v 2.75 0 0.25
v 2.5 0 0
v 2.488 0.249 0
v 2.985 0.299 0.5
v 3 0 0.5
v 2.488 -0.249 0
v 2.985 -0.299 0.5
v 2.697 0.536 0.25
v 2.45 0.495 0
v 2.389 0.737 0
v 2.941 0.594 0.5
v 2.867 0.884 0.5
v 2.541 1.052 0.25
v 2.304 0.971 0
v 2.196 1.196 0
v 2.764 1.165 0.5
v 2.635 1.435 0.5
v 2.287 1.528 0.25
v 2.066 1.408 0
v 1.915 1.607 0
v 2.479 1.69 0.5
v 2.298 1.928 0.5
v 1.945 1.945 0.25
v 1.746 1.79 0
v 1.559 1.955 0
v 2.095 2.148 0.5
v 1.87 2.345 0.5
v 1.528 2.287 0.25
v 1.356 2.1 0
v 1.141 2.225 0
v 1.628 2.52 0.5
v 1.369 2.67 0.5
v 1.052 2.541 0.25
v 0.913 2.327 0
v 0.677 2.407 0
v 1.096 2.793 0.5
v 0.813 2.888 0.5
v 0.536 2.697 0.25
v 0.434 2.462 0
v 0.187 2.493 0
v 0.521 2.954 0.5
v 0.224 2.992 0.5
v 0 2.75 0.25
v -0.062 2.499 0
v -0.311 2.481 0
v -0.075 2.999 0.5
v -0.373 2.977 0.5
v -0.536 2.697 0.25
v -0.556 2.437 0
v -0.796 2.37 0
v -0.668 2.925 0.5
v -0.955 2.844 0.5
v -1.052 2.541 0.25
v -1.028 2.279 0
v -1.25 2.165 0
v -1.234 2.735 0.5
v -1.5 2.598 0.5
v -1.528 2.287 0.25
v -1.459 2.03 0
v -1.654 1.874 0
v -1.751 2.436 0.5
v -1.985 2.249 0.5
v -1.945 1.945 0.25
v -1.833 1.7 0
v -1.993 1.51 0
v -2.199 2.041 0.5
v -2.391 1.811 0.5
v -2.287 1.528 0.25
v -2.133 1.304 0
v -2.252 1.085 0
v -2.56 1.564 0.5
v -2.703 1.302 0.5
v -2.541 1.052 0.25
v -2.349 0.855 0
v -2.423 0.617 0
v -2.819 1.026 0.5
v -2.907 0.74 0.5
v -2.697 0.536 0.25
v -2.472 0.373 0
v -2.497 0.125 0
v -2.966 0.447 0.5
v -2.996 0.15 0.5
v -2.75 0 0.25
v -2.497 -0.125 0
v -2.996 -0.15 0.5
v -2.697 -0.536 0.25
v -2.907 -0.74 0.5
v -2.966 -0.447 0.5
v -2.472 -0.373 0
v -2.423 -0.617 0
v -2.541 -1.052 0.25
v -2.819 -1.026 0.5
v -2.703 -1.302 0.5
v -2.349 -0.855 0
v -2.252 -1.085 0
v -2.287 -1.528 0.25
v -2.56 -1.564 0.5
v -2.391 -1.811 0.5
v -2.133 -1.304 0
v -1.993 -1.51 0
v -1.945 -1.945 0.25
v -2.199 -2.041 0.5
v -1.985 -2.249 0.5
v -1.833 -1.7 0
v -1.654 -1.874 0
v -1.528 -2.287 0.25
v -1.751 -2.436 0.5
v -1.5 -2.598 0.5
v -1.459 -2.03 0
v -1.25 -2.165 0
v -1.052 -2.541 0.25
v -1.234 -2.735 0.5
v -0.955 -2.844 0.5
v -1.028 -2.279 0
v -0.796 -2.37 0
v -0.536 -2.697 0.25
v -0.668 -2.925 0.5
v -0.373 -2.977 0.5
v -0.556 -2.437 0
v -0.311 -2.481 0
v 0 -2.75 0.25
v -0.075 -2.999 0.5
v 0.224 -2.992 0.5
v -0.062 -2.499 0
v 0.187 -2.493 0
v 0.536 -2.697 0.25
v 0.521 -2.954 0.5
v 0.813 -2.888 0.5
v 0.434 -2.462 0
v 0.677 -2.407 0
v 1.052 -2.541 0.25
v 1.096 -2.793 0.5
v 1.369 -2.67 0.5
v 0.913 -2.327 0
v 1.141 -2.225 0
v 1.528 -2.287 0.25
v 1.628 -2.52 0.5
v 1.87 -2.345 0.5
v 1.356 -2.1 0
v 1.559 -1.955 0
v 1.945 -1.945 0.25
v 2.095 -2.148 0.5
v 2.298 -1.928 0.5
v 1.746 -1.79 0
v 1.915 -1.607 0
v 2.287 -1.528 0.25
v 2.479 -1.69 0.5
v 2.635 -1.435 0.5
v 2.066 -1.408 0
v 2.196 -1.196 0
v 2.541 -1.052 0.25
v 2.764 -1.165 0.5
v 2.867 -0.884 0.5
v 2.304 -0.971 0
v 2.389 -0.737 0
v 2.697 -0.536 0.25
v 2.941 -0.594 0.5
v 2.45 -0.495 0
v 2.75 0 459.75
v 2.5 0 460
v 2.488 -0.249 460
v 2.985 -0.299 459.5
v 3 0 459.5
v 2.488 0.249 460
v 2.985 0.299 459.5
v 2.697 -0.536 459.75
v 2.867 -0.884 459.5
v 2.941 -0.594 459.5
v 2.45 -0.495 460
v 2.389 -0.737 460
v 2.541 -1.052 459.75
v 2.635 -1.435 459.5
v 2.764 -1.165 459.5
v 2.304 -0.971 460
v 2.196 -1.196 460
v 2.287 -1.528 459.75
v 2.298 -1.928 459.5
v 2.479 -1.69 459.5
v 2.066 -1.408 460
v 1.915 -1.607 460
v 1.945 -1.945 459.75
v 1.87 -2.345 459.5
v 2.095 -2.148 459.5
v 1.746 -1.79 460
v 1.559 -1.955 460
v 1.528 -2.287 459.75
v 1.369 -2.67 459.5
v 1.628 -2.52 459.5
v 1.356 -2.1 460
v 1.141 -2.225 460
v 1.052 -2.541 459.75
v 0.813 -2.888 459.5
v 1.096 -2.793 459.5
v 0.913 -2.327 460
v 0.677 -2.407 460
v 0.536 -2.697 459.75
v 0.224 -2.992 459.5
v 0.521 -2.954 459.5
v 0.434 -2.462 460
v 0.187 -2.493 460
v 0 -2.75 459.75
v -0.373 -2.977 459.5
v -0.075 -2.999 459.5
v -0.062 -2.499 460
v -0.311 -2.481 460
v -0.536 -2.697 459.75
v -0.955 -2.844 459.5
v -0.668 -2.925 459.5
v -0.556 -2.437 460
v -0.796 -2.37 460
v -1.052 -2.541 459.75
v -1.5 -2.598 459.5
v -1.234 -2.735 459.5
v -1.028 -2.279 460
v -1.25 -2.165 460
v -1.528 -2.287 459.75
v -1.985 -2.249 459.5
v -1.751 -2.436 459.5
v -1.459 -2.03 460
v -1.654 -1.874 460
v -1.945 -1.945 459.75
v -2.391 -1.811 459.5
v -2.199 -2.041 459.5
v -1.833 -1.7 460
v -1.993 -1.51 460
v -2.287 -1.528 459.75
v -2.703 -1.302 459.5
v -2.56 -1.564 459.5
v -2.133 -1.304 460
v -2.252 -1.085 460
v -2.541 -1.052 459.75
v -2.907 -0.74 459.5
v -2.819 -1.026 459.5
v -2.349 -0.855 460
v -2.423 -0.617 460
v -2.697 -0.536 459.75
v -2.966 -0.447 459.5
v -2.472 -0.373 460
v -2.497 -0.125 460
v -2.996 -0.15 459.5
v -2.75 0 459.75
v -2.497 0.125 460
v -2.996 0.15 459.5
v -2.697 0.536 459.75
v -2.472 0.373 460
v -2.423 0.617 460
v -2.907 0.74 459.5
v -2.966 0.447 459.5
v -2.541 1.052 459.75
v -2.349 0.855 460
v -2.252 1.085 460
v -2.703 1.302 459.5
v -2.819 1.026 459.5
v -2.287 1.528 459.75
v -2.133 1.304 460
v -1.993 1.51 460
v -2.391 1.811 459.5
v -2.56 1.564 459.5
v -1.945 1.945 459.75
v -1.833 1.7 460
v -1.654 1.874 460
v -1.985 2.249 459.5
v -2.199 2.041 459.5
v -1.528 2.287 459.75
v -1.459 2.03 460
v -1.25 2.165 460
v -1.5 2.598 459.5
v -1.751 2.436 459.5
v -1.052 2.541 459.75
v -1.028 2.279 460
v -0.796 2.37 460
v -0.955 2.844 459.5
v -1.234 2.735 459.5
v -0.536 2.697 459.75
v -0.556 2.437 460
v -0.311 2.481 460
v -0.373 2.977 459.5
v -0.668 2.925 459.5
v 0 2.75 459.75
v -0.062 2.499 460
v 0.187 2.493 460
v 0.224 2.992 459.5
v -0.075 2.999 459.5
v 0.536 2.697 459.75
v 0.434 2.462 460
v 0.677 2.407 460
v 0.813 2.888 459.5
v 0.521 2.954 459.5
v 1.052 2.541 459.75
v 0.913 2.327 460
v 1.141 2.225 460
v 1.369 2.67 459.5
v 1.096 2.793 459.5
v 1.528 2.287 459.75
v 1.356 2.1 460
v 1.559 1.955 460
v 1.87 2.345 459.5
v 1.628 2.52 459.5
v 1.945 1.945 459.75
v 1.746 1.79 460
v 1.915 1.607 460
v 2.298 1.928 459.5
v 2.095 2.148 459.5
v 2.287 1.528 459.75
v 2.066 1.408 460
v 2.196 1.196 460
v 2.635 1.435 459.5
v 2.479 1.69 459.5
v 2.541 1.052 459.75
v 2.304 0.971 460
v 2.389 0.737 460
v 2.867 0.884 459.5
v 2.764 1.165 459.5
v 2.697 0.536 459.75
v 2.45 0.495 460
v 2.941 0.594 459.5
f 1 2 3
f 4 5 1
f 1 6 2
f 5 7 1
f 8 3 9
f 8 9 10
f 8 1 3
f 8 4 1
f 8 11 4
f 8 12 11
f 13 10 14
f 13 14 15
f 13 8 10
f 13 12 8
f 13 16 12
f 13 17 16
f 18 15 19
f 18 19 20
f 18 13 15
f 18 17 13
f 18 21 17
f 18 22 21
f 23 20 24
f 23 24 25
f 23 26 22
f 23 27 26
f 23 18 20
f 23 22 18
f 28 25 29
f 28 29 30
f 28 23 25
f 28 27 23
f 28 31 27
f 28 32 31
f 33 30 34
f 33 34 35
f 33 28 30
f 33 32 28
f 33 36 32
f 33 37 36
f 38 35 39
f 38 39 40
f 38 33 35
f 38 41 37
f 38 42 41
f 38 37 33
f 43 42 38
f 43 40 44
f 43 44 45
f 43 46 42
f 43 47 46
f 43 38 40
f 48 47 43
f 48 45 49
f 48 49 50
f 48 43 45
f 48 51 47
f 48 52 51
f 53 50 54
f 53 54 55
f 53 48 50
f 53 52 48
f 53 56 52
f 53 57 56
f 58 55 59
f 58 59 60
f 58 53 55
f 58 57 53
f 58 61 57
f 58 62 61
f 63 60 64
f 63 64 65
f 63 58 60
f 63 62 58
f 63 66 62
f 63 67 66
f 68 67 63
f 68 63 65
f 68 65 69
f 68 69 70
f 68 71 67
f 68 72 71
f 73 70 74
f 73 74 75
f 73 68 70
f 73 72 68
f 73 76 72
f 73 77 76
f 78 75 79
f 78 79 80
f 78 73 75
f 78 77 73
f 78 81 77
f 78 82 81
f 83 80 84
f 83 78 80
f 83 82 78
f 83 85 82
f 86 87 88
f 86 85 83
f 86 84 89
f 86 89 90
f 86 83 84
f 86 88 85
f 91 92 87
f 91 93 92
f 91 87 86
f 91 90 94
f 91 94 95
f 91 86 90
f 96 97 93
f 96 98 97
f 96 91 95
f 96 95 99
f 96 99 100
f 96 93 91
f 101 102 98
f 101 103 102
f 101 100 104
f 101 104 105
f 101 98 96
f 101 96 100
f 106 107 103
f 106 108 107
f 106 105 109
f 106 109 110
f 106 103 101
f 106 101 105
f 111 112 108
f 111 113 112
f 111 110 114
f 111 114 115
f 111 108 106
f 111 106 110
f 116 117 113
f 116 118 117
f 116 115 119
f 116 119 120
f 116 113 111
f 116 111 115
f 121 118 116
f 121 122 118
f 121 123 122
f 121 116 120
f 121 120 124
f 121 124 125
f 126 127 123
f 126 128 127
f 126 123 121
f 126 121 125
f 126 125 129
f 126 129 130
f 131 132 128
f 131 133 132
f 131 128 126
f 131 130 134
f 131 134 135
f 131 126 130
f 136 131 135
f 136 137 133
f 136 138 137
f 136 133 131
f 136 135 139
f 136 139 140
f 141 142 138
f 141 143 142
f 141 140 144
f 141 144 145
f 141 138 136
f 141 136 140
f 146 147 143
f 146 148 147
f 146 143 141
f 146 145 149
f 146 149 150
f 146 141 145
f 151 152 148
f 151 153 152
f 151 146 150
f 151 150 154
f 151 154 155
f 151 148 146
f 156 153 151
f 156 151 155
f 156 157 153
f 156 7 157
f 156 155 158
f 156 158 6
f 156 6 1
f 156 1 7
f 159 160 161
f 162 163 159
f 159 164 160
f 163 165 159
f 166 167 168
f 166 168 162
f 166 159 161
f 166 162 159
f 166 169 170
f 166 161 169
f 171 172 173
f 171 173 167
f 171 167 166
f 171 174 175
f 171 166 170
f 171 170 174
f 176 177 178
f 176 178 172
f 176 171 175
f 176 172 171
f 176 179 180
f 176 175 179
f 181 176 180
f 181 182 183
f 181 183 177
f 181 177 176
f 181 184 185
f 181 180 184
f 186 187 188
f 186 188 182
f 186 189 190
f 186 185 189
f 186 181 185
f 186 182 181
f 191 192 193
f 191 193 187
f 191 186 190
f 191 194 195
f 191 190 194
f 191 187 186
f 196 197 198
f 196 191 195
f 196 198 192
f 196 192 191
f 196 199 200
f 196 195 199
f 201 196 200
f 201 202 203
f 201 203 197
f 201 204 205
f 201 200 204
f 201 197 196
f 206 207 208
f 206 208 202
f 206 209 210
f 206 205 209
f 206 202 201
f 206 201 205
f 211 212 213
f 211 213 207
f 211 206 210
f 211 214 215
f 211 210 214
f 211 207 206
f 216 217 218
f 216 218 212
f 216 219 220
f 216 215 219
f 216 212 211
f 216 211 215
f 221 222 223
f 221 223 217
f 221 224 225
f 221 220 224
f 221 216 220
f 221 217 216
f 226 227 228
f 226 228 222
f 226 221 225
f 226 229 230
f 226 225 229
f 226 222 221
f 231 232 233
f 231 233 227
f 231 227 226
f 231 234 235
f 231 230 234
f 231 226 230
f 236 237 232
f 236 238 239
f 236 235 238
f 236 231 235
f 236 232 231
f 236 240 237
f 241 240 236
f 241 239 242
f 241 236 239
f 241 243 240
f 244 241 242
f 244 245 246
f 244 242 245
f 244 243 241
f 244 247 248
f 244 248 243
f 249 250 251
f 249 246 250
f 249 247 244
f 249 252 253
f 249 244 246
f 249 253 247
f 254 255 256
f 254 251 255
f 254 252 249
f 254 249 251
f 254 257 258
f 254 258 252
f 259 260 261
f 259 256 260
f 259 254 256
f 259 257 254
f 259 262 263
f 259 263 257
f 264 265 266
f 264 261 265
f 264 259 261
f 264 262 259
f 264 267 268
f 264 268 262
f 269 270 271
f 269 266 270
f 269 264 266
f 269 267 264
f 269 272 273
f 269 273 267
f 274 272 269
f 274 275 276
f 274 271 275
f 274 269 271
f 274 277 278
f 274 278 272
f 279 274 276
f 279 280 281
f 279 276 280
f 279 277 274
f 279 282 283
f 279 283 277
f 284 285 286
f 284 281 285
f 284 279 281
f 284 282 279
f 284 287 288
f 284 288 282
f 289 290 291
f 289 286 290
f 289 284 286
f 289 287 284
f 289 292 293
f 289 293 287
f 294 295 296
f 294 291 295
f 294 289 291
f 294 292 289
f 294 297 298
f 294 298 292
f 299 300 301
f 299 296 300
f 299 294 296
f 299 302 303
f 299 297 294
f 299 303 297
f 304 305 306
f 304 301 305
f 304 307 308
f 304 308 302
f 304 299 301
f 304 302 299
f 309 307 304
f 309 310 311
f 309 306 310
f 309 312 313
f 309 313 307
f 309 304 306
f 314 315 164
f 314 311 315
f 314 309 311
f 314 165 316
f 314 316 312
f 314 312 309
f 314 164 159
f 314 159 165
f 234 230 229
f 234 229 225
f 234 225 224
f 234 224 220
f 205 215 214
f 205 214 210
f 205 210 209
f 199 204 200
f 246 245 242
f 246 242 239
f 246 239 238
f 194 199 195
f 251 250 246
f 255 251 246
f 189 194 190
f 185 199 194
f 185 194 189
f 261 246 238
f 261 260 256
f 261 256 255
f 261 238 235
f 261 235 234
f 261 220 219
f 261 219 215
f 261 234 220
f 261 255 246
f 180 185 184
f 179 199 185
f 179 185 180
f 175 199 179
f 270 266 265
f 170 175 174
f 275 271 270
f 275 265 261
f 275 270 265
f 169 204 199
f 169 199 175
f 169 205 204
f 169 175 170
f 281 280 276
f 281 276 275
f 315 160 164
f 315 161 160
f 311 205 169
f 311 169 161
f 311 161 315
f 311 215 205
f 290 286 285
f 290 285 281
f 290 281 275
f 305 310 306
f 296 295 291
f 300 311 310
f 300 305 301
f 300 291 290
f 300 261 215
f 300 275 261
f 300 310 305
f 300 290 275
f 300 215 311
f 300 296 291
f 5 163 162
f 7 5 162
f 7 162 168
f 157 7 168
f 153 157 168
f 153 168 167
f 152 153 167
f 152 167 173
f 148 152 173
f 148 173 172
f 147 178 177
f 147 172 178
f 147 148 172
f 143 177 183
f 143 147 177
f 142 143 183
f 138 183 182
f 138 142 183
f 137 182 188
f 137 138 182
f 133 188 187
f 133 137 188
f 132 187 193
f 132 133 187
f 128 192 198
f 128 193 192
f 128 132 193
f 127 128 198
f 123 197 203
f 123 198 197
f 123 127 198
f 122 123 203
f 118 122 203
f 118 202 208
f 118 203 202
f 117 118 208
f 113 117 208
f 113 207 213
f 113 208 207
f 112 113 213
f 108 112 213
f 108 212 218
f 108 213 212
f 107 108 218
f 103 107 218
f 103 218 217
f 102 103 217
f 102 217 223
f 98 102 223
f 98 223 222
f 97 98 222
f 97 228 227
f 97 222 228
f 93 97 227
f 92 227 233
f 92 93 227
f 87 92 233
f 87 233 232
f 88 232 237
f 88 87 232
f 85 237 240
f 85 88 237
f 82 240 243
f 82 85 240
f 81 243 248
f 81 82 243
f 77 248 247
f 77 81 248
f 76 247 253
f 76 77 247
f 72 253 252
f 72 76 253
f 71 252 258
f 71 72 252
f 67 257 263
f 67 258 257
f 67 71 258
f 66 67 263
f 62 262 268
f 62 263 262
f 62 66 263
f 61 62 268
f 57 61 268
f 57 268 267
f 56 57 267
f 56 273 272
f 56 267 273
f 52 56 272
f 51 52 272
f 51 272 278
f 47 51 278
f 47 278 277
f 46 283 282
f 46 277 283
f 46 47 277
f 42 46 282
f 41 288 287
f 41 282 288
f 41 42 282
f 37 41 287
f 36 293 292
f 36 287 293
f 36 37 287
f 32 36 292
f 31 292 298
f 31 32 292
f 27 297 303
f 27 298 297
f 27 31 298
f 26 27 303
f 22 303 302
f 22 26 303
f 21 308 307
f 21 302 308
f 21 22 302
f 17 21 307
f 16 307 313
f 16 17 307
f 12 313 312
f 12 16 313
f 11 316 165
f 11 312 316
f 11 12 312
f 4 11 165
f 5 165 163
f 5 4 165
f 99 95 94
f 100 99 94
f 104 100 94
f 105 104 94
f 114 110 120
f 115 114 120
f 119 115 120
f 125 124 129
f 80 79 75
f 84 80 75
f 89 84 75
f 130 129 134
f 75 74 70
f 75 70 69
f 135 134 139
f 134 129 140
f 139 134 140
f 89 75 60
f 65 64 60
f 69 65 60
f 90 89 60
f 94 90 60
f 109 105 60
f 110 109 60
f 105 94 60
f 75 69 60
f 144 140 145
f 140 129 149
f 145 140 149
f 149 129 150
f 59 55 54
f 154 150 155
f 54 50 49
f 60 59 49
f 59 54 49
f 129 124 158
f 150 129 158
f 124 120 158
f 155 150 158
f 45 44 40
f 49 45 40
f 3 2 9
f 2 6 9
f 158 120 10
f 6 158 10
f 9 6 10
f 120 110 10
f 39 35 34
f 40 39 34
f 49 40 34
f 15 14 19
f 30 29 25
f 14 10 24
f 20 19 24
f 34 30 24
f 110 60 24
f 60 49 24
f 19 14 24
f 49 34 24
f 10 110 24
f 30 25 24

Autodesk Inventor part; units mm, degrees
ref_plane "YZ Plane" through (0, 0, 0) normal (1, 0, 0) x (0, 1, 0)
ref_plane "XZ Plane" through (0, 0, 0) normal (0, 1, 0) x (-1, 0, 0)
ref_plane "XY Plane" through (0, 0, 0) normal (0, 0, 1) x (1, 0, 0)
sketch "Sketch1" plane through (0, 0, 0) normal (0, 0, 1) x (1, 0, 0)
  circle A0 centre (0, 0) radius 3
  dimension "d0" = 6
extrude "Extrusion1" add sketch "Sketch1" along normal blind 460
chamfer "Chamfer1" distance 0.5 angle 45 1 edges at (-3, 0, 0)
chamfer "Chamfer2" distance 0.5 angle 45 1 edges at (-3, 0, 460)
properties part number "6mmx460mmSmoothRod"
